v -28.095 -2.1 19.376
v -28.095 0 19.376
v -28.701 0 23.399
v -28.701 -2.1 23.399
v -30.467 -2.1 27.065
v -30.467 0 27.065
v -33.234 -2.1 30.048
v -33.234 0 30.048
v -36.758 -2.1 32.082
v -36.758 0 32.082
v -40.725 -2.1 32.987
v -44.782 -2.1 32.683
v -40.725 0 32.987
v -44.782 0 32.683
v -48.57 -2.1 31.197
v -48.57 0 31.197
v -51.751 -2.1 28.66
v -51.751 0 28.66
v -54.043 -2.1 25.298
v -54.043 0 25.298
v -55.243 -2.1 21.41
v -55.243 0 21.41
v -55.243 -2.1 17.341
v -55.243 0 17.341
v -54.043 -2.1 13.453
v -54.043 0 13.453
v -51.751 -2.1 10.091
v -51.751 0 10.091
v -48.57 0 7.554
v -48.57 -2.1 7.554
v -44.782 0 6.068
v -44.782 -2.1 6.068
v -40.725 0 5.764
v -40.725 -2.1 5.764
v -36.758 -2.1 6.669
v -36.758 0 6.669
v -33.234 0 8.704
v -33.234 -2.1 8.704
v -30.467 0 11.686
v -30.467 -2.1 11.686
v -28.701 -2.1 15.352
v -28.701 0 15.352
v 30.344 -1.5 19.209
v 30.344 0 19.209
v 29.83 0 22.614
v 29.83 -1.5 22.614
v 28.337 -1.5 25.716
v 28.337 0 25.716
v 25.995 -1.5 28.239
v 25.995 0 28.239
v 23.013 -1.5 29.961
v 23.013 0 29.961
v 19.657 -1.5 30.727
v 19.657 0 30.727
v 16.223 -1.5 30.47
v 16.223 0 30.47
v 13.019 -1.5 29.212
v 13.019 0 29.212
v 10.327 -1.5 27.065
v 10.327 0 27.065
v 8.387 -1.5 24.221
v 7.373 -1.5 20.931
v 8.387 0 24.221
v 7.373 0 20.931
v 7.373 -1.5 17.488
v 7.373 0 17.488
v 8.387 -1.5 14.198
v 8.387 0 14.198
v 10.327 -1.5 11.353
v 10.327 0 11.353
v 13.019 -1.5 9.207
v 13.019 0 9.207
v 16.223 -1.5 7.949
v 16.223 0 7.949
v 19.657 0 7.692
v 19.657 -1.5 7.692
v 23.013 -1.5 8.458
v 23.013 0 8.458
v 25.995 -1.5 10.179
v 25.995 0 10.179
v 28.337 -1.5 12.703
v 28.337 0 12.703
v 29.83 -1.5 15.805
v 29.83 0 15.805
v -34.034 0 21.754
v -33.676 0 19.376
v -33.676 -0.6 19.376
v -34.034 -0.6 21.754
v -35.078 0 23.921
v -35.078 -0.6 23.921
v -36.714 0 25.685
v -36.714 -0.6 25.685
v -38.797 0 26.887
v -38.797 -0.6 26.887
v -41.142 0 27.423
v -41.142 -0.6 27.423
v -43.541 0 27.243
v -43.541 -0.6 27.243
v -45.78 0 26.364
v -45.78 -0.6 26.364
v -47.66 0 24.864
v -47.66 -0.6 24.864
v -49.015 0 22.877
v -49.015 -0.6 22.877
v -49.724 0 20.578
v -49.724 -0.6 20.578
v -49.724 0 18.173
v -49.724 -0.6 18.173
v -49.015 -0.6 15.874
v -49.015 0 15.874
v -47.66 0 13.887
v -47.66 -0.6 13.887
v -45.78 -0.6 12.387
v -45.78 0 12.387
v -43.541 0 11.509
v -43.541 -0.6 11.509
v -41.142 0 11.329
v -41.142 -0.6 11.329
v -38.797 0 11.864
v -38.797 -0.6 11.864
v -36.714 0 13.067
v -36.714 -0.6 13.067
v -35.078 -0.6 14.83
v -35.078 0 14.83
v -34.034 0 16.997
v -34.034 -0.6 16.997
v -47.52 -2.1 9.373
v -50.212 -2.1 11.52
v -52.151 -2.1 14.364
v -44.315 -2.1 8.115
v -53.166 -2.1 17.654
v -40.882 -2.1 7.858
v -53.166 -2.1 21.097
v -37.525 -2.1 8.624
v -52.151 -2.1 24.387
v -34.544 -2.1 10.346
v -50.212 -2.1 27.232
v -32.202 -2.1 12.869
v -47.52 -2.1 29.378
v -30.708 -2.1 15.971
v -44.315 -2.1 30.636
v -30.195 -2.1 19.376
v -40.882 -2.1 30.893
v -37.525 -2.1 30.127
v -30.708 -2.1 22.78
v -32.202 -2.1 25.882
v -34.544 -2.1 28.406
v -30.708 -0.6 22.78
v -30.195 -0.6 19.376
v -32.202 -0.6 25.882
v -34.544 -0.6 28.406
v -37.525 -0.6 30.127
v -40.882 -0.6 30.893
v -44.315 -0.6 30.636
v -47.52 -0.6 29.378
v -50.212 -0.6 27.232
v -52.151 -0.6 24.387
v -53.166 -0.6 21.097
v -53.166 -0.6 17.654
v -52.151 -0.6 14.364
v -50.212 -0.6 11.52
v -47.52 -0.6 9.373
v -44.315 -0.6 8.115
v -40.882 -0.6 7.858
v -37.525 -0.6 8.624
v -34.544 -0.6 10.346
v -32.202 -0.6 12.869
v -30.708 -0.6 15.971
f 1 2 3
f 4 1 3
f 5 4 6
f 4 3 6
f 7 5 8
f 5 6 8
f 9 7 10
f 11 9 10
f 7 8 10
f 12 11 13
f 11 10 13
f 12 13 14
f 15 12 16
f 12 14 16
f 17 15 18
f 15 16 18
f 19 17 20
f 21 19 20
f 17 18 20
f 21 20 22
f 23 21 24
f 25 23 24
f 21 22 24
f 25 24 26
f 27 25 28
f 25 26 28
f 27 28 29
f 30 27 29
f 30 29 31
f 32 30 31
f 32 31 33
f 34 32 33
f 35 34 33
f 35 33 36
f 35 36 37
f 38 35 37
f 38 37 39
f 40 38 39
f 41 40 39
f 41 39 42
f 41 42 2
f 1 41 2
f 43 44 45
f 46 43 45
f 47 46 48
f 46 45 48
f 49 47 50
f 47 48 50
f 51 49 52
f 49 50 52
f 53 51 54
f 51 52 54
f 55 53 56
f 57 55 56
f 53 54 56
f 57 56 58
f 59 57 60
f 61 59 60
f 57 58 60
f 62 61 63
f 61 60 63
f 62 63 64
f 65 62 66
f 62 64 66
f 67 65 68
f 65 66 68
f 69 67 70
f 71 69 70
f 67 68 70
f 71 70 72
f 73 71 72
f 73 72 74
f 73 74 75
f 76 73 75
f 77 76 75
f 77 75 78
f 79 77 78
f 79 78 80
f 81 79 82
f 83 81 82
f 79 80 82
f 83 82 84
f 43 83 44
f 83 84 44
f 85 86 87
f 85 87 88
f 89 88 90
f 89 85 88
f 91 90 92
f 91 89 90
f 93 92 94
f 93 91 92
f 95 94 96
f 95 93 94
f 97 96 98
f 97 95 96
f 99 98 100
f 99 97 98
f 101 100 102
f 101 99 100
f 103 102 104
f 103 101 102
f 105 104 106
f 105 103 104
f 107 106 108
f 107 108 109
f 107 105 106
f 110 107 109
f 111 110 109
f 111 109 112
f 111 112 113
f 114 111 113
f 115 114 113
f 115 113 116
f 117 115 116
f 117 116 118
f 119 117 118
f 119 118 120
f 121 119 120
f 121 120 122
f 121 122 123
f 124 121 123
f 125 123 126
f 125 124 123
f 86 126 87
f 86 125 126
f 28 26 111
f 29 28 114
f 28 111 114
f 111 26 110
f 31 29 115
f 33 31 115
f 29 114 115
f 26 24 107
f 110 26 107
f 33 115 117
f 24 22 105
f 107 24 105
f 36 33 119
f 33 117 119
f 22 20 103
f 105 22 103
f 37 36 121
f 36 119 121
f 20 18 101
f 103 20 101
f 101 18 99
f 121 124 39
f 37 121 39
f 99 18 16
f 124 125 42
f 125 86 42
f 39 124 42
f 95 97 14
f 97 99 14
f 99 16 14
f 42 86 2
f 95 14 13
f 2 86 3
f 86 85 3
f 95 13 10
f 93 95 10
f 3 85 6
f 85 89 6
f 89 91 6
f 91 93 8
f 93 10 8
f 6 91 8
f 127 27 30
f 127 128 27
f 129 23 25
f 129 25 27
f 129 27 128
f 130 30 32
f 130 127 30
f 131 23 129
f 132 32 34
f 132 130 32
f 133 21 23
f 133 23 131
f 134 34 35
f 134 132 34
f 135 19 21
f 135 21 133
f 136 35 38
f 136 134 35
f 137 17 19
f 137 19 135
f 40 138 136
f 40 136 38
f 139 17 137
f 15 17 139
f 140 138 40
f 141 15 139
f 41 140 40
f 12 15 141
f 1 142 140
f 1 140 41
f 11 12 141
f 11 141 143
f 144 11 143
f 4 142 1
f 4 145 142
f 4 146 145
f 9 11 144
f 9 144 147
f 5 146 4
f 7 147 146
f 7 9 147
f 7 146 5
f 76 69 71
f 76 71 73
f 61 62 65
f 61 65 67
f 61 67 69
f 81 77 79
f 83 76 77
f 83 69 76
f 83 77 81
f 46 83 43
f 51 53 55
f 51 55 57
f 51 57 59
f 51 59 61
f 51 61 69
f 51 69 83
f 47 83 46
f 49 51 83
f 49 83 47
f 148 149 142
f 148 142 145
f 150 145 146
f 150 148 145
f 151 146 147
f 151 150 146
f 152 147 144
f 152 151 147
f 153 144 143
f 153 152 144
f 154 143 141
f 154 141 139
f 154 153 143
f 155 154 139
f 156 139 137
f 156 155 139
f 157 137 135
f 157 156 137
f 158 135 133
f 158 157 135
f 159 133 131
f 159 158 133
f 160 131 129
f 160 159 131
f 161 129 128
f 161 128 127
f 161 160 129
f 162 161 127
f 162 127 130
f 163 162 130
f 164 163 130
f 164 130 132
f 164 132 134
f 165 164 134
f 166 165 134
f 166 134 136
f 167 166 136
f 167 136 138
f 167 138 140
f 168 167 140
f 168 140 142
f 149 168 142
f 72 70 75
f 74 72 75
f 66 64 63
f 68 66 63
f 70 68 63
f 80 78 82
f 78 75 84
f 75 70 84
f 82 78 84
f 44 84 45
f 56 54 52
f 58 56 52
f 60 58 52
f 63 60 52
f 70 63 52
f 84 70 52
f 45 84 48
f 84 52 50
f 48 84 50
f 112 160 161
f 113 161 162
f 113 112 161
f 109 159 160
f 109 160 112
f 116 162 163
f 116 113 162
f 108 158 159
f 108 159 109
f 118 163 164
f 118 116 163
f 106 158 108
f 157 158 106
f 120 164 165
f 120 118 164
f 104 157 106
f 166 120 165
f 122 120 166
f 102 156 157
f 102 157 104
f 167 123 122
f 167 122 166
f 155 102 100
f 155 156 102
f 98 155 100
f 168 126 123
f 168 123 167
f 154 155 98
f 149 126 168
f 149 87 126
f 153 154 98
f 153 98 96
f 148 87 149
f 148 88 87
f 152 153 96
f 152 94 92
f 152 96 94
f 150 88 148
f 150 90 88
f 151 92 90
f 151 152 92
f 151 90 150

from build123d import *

# Parameters (mm, degrees)
F0_R     = 13.65
F0_R_2   = 11.55
F0_R_3   = 8.069472
F1_DEPTH = 0.6
F2_DEPTH = 2.1
F3_R     = 11.55
F4_DEPTH = 1.5


with BuildPart() as f1:
    # F0 (on Front) → F1 (new body)
    with BuildSketch(Plane.XZ):
        with Locations((-41.744985, 19.37566)):
            Circle(F0_R)
        with Locations((-41.744985, 19.37566)):
            Circle(F0_R_2, mode=Mode.SUBTRACT)
        with Locations((-41.744985, 19.37566)):
            Circle(F0_R_2)
        with Locations((-41.744985, 19.37566)):
            Circle(F0_R_3, mode=Mode.SUBTRACT)
    extrude(amount=F1_DEPTH)

    # F0 (on Front) → F2 (join)
    with BuildSketch(Plane.XZ):
        with Locations((-41.744985, 19.37566)):
            Circle(F0_R)
        with Locations((-41.744985, 19.37566)):
            Circle(F0_R_2, mode=Mode.SUBTRACT)
    extrude(amount=F2_DEPTH)


with BuildPart() as f4:
    # F3 (on Front) → F4 (new body)
    with BuildSketch(Plane.XZ):
        with Locations((18.793561, 19.209346)):
            Circle(F3_R)
    extrude(amount=F4_DEPTH)


solid = Compound([f1.part, f4.part])
